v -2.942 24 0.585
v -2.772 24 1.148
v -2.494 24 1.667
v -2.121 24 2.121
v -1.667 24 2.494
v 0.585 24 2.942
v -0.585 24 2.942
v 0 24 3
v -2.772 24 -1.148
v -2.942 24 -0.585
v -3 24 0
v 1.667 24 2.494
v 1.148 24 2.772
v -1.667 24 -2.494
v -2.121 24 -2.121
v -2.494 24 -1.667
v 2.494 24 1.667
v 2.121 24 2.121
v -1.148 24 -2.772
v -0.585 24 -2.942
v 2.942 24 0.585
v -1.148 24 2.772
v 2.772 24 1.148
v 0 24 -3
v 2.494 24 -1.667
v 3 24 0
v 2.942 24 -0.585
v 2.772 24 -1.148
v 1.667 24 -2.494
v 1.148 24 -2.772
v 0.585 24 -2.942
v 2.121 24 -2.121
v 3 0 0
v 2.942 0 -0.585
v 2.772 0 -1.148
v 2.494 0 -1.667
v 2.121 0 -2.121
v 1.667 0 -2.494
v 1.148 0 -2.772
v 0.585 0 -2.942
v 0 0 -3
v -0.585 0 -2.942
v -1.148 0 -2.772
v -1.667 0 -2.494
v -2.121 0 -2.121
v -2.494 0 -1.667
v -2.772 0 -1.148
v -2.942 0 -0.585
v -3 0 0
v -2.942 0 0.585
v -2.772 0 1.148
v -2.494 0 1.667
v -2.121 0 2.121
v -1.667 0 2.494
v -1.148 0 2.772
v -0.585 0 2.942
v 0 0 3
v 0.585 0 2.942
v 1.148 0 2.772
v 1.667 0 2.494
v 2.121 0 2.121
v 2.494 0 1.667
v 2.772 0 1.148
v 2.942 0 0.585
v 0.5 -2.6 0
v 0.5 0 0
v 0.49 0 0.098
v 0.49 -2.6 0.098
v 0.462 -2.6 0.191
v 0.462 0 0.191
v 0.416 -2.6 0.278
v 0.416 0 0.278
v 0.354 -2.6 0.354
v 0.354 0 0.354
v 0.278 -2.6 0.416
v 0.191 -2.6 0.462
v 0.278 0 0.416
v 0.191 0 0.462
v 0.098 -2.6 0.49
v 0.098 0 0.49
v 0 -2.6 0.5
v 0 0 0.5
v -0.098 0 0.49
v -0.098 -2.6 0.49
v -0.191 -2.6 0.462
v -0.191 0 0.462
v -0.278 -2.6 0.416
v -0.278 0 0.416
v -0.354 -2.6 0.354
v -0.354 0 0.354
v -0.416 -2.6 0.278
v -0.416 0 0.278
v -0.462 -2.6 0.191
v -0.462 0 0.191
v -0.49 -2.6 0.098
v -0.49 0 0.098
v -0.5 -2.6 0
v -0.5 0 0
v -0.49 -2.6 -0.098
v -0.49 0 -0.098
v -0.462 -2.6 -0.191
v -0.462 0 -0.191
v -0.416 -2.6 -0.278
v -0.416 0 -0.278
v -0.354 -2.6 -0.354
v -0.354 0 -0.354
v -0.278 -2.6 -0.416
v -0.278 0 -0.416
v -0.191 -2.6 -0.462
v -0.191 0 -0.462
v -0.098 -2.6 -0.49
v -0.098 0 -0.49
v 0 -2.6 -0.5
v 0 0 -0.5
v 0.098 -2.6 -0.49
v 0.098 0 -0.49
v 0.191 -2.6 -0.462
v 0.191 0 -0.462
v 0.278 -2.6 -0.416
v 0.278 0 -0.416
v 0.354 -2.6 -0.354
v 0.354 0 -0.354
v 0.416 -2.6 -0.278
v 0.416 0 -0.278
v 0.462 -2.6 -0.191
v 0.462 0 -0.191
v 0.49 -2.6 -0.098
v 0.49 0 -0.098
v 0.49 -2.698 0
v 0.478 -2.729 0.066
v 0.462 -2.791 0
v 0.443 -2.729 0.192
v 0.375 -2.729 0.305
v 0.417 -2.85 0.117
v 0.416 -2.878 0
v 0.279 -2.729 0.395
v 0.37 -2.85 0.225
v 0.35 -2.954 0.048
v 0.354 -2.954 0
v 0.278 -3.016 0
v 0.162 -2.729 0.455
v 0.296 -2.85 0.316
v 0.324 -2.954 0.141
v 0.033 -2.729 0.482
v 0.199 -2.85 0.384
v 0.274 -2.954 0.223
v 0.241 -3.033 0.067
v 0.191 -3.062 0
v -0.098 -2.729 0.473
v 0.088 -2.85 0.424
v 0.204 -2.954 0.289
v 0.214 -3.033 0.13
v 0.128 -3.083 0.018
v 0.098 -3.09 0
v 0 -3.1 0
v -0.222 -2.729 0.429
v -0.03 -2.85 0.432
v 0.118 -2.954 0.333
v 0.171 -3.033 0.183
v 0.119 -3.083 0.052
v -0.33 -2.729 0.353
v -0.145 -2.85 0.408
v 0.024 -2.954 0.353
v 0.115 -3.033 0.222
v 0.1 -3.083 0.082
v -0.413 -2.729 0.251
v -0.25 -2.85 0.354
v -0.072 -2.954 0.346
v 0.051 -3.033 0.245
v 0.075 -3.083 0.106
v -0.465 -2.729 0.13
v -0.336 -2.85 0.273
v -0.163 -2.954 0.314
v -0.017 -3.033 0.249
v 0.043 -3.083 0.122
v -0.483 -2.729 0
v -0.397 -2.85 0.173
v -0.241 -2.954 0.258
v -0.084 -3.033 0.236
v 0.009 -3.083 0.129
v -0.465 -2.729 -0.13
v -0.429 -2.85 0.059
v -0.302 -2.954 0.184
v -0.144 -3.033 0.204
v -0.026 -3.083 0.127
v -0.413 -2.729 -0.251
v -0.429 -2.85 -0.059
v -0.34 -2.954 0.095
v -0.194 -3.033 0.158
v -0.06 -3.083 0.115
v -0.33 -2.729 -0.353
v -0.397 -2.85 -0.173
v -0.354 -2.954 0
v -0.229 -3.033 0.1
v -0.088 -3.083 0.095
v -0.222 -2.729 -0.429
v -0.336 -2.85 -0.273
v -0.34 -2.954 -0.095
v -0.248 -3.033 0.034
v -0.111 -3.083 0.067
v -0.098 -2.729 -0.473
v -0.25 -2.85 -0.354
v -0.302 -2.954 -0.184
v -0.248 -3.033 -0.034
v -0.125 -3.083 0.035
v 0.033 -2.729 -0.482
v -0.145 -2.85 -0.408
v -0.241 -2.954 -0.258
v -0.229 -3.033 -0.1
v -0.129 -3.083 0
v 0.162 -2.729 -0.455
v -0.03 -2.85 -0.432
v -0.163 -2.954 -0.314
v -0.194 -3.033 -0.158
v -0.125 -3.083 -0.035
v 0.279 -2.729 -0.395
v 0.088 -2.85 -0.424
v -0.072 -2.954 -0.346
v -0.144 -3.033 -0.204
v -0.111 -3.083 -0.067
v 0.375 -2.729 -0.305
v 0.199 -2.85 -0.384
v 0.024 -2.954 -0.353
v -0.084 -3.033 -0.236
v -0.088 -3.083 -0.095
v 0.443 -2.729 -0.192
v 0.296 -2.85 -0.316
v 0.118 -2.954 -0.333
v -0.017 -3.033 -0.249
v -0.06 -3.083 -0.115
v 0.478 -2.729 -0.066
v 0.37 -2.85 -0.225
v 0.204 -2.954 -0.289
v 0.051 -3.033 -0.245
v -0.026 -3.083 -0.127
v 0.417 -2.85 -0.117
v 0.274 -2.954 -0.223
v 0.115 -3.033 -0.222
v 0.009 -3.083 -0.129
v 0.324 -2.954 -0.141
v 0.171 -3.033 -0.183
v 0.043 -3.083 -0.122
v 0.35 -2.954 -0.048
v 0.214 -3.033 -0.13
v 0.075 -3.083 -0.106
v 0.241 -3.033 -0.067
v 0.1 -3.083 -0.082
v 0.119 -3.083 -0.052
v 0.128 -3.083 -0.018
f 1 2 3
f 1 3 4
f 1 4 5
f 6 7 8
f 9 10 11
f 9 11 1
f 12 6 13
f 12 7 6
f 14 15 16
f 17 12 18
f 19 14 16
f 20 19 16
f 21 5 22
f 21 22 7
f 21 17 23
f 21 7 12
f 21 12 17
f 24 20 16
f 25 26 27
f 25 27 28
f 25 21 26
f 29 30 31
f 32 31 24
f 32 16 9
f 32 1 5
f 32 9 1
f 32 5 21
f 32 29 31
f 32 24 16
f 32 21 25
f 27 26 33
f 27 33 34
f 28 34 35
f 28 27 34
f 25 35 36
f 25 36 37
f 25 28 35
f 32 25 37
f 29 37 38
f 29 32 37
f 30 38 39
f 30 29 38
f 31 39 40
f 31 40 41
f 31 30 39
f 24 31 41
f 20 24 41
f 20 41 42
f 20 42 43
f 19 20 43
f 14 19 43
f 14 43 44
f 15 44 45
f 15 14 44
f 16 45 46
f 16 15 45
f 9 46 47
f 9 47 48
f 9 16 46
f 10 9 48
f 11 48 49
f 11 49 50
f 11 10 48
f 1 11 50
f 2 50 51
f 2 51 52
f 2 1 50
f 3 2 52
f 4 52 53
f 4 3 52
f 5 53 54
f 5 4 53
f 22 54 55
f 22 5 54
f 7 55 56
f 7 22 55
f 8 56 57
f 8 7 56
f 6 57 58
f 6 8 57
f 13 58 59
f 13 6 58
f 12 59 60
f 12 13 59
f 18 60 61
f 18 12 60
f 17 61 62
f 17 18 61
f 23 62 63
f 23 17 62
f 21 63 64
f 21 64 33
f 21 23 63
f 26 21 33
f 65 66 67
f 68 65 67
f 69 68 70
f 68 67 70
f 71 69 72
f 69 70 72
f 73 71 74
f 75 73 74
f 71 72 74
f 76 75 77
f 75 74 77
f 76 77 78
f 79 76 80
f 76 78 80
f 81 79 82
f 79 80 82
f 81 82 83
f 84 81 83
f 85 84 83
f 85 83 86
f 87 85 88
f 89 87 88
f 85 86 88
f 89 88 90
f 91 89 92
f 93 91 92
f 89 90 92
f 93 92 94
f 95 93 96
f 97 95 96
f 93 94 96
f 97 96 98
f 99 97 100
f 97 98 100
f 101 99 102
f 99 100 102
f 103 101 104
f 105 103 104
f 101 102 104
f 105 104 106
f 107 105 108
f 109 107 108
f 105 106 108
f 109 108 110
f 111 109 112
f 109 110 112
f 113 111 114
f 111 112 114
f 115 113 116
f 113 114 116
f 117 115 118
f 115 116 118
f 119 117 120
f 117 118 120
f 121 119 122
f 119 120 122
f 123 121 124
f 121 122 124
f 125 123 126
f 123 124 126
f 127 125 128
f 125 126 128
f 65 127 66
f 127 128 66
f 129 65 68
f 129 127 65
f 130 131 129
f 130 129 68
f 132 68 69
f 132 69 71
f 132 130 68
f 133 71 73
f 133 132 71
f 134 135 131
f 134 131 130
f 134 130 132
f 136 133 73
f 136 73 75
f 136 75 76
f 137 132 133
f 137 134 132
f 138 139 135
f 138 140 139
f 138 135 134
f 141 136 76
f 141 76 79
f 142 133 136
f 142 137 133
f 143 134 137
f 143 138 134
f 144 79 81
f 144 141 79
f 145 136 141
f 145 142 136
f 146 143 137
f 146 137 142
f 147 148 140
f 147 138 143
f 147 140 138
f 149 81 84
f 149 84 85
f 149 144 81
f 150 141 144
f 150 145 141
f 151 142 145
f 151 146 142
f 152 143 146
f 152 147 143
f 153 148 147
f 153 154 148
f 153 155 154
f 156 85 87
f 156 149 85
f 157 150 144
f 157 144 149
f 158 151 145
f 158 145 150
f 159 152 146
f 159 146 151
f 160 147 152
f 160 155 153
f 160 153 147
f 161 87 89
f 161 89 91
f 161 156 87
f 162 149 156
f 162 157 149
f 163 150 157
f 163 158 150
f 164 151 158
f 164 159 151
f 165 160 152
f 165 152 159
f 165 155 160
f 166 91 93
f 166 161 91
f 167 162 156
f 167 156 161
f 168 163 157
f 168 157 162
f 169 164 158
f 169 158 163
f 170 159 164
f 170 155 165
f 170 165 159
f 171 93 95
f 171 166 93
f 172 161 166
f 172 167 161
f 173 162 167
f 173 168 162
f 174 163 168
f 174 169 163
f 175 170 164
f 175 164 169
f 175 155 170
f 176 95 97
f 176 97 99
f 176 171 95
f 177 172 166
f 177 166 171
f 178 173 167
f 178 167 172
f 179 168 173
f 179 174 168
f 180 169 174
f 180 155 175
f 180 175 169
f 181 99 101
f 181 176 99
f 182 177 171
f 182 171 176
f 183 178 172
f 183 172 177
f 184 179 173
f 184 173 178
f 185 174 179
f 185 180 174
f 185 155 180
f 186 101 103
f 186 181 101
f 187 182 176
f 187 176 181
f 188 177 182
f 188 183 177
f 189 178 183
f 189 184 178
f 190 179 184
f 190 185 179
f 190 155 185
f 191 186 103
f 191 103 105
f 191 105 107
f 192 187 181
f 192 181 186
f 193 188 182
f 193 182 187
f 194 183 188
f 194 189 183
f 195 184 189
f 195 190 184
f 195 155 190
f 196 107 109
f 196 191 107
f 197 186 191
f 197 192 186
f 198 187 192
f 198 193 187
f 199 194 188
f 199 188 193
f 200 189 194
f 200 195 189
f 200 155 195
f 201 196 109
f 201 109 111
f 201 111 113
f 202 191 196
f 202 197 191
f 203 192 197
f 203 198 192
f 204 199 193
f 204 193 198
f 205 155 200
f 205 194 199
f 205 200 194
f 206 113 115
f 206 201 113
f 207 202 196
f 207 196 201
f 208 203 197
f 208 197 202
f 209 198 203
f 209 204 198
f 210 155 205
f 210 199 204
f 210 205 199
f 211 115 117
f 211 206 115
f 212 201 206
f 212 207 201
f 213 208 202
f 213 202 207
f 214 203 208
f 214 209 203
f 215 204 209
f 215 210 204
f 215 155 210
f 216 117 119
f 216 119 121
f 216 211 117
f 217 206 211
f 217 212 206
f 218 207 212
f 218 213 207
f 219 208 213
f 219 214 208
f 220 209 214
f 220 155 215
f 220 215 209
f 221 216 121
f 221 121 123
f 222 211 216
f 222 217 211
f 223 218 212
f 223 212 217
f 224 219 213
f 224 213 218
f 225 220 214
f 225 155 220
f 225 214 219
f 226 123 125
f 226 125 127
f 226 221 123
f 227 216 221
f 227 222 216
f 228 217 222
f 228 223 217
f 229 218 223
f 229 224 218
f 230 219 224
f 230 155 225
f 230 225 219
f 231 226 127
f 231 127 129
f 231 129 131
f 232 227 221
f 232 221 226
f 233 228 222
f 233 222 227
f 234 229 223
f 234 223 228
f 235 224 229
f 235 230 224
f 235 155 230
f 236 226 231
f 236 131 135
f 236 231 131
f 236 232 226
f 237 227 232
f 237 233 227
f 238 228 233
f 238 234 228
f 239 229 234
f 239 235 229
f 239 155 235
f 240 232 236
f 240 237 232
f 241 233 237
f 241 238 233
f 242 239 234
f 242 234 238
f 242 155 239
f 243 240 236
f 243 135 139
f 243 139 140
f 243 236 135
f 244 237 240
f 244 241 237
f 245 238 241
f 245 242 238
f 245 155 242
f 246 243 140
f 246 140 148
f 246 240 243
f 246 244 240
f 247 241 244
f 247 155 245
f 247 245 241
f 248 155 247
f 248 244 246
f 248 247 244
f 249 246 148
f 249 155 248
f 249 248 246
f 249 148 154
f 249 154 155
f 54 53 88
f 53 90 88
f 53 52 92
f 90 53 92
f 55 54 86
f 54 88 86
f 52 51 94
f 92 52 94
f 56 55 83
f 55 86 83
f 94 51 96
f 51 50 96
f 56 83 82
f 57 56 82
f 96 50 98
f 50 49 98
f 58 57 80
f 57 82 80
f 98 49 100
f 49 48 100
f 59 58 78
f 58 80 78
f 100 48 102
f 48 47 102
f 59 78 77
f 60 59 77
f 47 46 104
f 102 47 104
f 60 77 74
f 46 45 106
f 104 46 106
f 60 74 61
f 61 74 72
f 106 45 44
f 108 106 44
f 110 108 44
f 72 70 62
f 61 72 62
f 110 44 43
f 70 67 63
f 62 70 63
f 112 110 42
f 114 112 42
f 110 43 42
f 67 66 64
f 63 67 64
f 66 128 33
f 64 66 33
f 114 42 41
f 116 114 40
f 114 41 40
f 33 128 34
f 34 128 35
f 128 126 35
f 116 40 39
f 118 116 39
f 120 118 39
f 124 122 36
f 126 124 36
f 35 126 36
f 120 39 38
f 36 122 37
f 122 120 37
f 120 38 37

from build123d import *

# Parameters (mm, degrees)
SKETCH_1_R      = 1.5
EXTRUDE_2_DEPTH = 24
SKETCH_3_R      = 0.5
EXTRUDE_3_DEPTH = 3.1
FILLET_1_R      = 0.5
SKETCH_4_R      = 3
EXTRUDE_4_DEPTH = 24


with BuildPart() as part:
    # ｽｹｯﾁ1 → ﾎﾞｽ - 押し出し2 (new body)
    with BuildSketch(Plane(origin=(0, 0, 0), x_dir=(1, 0, 0), z_dir=(0, 1, 0))):
        Circle(SKETCH_1_R)
    extrude(amount=EXTRUDE_2_DEPTH)

    # ｽｹｯﾁ3 → ﾎﾞｽ - 押し出し3 (add)
    with BuildSketch(Plane.XZ):
        Circle(SKETCH_3_R)
    extrude(amount=EXTRUDE_3_DEPTH)

    # ﾌｨﾚｯﾄ1
    fillet_1_edges = [part.edges().sort_by_distance(p)[0] for p in [
        (-0.5, -3.1, 0),
    ]]
    fillet(fillet_1_edges, radius=FILLET_1_R)

    # ｽｹｯﾁ4 → ﾎﾞｽ - 押し出し4 (add)
    with BuildSketch(Plane(origin=(0, 24, 0), x_dir=(1, 0, 0), z_dir=(0, 1, 0))):
        Circle(SKETCH_4_R)
    extrude(amount=-EXTRUDE_4_DEPTH)


solid = part.part
